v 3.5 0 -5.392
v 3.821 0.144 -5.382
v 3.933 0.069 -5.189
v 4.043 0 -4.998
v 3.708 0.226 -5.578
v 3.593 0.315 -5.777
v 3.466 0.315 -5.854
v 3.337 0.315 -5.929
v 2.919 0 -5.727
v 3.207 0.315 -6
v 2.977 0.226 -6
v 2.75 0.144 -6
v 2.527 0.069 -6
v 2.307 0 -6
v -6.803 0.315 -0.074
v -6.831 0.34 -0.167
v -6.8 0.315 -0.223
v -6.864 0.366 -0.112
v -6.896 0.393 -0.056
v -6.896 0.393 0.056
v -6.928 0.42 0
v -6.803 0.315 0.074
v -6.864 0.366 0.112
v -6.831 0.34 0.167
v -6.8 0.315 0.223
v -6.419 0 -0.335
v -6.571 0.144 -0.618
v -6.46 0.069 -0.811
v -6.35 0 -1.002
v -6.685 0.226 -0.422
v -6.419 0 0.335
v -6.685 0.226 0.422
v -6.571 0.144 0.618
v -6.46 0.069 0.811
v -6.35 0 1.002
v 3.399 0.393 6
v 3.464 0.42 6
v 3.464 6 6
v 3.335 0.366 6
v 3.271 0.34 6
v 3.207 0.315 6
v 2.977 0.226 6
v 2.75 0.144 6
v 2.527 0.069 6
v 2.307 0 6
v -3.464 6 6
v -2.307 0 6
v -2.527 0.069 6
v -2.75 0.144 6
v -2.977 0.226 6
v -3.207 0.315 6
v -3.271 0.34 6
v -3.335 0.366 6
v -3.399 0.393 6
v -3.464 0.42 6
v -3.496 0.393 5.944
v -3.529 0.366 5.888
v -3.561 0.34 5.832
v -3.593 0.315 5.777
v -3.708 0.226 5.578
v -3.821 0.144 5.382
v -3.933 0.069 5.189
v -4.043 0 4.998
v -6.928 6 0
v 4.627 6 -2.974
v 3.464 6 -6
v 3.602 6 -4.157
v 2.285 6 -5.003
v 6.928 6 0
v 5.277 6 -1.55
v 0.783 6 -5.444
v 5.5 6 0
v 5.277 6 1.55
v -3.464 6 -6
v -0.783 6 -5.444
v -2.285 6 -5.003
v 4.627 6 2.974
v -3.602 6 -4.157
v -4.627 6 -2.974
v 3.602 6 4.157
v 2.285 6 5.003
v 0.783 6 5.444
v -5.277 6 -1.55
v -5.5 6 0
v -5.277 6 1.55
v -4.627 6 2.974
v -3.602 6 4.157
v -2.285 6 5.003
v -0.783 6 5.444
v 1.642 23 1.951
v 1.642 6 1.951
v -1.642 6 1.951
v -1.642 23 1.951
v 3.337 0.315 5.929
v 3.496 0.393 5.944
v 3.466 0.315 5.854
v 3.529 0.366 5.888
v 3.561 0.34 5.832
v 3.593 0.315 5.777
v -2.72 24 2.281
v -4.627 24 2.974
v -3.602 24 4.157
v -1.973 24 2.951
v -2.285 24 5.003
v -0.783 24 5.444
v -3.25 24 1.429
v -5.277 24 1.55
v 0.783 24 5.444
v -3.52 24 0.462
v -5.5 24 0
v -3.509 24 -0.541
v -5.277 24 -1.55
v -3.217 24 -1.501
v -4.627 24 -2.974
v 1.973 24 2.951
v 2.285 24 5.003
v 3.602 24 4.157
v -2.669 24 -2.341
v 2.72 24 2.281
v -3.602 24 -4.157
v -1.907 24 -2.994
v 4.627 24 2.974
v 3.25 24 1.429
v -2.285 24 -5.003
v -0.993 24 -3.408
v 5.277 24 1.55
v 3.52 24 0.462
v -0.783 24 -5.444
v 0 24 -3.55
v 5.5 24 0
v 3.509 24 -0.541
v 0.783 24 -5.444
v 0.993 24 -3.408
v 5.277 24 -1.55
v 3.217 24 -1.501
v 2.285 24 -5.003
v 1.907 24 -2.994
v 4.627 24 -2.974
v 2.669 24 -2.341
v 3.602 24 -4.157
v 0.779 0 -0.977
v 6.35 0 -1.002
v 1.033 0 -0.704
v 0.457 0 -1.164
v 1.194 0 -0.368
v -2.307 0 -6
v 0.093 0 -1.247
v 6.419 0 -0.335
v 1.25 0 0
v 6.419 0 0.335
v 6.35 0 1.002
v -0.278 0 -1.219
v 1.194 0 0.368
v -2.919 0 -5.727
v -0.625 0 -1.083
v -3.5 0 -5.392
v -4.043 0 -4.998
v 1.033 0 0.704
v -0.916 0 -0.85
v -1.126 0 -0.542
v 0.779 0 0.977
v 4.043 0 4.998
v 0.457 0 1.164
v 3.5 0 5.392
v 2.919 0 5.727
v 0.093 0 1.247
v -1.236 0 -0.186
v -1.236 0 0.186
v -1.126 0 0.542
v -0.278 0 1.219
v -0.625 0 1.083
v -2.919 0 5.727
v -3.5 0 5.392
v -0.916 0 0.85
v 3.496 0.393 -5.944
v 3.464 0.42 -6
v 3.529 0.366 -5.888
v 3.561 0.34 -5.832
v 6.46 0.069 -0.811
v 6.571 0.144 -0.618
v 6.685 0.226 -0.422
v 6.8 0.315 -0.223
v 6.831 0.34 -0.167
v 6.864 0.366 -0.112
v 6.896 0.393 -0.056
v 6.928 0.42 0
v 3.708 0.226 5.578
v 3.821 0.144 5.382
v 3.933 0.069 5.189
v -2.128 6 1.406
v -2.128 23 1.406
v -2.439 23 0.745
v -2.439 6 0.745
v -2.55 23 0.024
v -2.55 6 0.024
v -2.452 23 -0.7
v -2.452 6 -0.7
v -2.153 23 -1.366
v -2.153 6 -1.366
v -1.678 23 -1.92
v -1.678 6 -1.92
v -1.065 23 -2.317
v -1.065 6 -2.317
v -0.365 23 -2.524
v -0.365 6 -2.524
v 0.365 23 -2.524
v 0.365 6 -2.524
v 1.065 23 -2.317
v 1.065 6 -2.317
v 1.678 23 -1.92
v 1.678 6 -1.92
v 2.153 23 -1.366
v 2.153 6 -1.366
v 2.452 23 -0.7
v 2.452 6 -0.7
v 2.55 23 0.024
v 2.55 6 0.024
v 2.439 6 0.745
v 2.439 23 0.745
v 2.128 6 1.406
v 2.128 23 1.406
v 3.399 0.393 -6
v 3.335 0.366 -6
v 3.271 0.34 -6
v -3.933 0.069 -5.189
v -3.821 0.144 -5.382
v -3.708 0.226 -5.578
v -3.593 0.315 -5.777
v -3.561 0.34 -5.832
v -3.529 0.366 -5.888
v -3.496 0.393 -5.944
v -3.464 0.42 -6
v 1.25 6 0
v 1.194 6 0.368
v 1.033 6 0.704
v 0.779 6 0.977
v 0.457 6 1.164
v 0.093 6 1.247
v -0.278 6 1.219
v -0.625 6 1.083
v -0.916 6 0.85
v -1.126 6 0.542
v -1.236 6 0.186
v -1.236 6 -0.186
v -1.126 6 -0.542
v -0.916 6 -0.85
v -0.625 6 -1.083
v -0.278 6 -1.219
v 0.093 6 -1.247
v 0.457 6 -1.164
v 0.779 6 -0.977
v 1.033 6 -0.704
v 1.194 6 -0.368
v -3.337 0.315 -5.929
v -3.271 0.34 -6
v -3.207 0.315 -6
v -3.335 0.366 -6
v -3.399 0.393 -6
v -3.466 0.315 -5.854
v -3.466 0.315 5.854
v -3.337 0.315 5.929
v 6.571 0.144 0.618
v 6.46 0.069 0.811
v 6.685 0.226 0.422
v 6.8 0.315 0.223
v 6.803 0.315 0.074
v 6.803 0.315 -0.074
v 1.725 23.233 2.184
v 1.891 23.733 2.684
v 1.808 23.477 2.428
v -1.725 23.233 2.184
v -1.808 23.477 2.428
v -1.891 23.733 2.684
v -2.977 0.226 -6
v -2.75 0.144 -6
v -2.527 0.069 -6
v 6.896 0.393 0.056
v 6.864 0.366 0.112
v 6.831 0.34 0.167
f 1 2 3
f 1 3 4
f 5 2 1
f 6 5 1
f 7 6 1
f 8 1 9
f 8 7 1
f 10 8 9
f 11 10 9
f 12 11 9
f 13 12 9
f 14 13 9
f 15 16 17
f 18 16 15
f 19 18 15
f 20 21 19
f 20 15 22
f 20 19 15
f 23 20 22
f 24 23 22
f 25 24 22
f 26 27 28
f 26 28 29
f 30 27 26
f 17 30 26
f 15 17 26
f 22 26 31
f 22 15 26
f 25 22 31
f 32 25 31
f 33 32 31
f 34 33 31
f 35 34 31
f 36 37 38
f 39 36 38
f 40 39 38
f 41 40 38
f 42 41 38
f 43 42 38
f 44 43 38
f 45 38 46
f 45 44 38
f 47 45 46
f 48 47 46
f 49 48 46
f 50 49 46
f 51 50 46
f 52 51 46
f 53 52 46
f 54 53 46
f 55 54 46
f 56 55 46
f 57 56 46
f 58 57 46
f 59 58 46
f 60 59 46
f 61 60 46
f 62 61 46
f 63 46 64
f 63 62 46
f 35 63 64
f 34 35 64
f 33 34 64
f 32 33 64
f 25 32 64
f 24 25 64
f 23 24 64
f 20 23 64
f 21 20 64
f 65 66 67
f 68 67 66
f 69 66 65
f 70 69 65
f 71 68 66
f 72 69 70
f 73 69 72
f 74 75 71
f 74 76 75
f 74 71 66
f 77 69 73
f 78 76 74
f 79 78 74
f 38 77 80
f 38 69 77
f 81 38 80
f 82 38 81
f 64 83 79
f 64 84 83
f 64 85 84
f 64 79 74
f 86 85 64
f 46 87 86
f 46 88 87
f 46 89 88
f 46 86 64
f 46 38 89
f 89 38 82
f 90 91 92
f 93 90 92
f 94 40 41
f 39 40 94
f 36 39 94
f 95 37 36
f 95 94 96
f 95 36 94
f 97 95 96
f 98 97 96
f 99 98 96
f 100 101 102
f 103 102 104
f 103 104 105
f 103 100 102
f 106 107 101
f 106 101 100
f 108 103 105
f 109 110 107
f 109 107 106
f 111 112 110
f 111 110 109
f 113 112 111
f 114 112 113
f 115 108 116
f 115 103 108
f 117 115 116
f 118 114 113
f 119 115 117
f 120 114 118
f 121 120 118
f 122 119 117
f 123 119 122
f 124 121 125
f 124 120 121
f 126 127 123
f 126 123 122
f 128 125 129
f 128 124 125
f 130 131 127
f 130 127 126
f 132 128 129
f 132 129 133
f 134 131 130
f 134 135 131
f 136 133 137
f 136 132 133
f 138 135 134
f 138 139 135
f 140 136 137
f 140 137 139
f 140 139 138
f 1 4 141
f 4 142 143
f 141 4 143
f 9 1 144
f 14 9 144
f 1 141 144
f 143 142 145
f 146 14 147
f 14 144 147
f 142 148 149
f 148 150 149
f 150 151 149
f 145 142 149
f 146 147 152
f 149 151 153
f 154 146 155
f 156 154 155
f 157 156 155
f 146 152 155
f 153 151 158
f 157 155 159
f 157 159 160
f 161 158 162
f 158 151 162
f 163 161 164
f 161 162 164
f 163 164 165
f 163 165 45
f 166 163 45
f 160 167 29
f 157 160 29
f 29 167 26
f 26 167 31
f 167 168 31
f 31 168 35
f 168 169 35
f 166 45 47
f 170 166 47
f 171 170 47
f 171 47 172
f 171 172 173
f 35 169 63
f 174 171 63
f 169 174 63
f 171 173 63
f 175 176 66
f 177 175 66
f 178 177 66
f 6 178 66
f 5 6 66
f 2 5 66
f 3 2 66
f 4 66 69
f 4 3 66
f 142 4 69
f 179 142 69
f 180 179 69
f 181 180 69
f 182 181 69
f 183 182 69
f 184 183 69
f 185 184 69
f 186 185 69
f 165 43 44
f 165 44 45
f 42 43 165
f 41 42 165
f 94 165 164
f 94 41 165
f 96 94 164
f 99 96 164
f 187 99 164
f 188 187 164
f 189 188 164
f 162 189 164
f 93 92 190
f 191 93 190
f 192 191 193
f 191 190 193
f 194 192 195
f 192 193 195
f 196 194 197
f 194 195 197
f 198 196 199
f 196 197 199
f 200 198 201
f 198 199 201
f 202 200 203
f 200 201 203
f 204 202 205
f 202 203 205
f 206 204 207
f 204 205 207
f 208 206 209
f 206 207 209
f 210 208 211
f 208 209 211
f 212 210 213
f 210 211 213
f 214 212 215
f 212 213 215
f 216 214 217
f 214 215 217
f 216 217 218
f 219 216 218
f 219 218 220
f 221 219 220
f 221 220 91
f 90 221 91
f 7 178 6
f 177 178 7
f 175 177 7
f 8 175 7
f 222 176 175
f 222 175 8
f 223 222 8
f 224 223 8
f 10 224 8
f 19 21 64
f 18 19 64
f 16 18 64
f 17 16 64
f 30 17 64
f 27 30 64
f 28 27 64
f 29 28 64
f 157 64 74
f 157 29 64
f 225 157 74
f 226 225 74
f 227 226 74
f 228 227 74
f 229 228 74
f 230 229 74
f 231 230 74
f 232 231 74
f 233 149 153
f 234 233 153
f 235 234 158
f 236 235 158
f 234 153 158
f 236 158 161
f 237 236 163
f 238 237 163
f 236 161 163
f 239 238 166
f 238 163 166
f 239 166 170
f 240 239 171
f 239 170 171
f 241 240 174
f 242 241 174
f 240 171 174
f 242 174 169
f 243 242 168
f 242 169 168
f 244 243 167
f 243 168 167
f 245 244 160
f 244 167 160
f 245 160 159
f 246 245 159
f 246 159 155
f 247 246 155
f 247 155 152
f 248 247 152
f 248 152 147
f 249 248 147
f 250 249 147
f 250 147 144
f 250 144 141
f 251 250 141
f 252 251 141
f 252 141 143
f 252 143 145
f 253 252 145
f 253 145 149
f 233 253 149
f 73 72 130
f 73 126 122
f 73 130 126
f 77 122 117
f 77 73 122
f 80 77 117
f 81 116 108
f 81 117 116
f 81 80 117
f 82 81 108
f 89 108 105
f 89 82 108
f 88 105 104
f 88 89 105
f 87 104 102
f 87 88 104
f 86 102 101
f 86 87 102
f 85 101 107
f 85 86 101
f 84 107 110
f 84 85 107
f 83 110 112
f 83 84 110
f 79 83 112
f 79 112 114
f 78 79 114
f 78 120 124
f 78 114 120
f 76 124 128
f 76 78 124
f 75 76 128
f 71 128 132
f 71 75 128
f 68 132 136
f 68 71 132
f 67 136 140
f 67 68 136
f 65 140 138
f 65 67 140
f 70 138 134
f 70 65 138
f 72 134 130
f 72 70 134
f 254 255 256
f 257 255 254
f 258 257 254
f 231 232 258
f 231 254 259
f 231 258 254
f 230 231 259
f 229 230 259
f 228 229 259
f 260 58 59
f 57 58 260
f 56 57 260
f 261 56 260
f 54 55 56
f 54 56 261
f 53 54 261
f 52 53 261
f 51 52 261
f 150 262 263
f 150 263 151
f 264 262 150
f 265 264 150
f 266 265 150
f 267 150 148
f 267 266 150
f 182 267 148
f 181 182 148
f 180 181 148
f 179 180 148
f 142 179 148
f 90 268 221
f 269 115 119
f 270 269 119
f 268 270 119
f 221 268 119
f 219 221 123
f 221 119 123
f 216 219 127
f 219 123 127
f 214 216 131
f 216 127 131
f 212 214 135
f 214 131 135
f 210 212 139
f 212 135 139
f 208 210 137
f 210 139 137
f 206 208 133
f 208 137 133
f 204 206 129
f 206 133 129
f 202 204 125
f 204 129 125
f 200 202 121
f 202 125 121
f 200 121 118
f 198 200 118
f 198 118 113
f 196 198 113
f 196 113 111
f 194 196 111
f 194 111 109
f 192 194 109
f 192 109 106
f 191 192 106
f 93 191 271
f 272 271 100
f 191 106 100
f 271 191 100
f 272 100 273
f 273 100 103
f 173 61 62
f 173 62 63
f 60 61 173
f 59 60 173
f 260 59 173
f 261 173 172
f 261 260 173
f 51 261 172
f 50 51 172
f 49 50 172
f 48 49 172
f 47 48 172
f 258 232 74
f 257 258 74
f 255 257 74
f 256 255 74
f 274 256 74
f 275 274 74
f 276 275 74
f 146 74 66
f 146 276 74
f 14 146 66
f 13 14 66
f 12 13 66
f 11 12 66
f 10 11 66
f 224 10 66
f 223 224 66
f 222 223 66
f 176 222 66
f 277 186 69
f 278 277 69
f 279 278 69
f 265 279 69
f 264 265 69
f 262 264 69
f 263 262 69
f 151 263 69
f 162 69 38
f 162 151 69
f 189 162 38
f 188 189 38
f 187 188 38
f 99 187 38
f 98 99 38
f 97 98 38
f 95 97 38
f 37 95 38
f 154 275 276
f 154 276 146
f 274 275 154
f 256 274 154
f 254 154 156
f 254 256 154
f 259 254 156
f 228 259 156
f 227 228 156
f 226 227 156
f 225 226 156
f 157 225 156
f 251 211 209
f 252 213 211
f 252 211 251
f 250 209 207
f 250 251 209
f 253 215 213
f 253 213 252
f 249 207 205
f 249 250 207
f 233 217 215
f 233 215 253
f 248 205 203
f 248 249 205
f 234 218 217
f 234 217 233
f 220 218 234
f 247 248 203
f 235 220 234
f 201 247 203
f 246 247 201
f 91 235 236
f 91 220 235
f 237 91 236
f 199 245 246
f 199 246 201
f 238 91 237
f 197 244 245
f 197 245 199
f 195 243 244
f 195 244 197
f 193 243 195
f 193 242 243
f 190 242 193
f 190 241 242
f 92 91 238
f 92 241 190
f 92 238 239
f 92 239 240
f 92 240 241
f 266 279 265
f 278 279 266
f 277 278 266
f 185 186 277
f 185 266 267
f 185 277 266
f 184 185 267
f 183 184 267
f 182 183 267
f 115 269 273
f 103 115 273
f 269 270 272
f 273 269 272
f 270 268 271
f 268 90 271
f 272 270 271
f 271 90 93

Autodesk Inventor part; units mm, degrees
ref_plane "YZ Plane" through (0, 0, 0) normal (1, 0, 0) x (0, 1, 0)
ref_plane "XZ Plane" through (0, 0, 0) normal (0, 1, 0) x (-1, 0, 0)
ref_plane "XY Plane" through (0, 0, 0) normal (0, 0, 1) x (1, 0, 0)
sketch "Sketch7" plane through (0, 0, 0) normal (0, 1, 0) x (-1, 0, 0)
  line L0 (-3.4641, -6) -> (-6.9282, 0)
  line L1 (-6.9282, 0) -> (-3.4641, 6)
  line L2 (-3.4641, 6) -> (3.4641, 6)
  line L3 (3.4641, 6) -> (6.9282, 0)
  line L4 (6.9282, 0) -> (3.4641, -6)
  line L5 (3.4641, -6) -> (-3.4641, -6)
  point P0 (0, 0)
  point P1 (0, 0)
  point P2 (0, -6)
  dimension "d24" = 12
extrude "Extrusion6" add sketch "Sketch7" along normal blind 6
sketch "Sketch8" plane through (0, 6, 0) normal (0, 1, 0) x (1, 0, 0)
  circle A0 centre (0, 0) radius 5.5
  circle A1 centre (0, 0) radius 2.55
  line L0 (-0.0689, 2.5491) -> (-0.0689, -1.9509)
  line L1 (-0.0689, -1.9509) -> (-1.6421, -1.9509)
  line L2 (-0.0689, -1.9509) -> (1.6421, -1.9509)
  dimension "d27" = 11
  dimension "d28" = 5.1
  dimension "d29" = 4.5
  dimension "d30" = 1.5732
extrude "Extrusion7" add sketch "Sketch8" along normal blind 18 contours A0 | A1 L1 L2
sketch "Sketch9" plane through (0, 0, 0) normal (0, 0, 1) x (1, 0, 0)
  line L0 (6.9282, 0) -> (3.4641, 0) projected
  line L1 (6.9282, 0) -> (6.4282, 0)
  line L2 (6.8032, 0.3147) -> (6.4282, 0)
  line L3 (6.9282, 0) -> (6.9282, 0.3868)
  line L4 (0, -4.8) -> (0, 28.8) projected
  line L5 (6.8032, 0.3147) -> (6.9282, 0.4195)
  line L6 (6.9282, 0.4195) -> (6.9282, 0.3868)
  point P0 (0, 0)
  dimension "d33" = 0.5
  dimension "d35" = 40
  dimension "d39" = 0.125
  dimension "d40" = 0.1049
revolve "Revolution1" cut sketch "Sketch9" angle 360 about axis through (0, -10, 0) along (0, 1, 0)
chamfer "Chamfer3" distance 1 angle 45 2 edges at (0, 24, -2.55) (0, 24, 1.9509)
sketch "Sketch10" plane through (0, 0, 0) normal (0, -1, 0) x (1, 0, 0)
  circle A0 centre (0, 0) radius 1.25
  dimension "d44" = 2.5
extrude "Extrusion8" cut sketch "Sketch10" against normal through all
properties part number "PIN_3DPrint"
